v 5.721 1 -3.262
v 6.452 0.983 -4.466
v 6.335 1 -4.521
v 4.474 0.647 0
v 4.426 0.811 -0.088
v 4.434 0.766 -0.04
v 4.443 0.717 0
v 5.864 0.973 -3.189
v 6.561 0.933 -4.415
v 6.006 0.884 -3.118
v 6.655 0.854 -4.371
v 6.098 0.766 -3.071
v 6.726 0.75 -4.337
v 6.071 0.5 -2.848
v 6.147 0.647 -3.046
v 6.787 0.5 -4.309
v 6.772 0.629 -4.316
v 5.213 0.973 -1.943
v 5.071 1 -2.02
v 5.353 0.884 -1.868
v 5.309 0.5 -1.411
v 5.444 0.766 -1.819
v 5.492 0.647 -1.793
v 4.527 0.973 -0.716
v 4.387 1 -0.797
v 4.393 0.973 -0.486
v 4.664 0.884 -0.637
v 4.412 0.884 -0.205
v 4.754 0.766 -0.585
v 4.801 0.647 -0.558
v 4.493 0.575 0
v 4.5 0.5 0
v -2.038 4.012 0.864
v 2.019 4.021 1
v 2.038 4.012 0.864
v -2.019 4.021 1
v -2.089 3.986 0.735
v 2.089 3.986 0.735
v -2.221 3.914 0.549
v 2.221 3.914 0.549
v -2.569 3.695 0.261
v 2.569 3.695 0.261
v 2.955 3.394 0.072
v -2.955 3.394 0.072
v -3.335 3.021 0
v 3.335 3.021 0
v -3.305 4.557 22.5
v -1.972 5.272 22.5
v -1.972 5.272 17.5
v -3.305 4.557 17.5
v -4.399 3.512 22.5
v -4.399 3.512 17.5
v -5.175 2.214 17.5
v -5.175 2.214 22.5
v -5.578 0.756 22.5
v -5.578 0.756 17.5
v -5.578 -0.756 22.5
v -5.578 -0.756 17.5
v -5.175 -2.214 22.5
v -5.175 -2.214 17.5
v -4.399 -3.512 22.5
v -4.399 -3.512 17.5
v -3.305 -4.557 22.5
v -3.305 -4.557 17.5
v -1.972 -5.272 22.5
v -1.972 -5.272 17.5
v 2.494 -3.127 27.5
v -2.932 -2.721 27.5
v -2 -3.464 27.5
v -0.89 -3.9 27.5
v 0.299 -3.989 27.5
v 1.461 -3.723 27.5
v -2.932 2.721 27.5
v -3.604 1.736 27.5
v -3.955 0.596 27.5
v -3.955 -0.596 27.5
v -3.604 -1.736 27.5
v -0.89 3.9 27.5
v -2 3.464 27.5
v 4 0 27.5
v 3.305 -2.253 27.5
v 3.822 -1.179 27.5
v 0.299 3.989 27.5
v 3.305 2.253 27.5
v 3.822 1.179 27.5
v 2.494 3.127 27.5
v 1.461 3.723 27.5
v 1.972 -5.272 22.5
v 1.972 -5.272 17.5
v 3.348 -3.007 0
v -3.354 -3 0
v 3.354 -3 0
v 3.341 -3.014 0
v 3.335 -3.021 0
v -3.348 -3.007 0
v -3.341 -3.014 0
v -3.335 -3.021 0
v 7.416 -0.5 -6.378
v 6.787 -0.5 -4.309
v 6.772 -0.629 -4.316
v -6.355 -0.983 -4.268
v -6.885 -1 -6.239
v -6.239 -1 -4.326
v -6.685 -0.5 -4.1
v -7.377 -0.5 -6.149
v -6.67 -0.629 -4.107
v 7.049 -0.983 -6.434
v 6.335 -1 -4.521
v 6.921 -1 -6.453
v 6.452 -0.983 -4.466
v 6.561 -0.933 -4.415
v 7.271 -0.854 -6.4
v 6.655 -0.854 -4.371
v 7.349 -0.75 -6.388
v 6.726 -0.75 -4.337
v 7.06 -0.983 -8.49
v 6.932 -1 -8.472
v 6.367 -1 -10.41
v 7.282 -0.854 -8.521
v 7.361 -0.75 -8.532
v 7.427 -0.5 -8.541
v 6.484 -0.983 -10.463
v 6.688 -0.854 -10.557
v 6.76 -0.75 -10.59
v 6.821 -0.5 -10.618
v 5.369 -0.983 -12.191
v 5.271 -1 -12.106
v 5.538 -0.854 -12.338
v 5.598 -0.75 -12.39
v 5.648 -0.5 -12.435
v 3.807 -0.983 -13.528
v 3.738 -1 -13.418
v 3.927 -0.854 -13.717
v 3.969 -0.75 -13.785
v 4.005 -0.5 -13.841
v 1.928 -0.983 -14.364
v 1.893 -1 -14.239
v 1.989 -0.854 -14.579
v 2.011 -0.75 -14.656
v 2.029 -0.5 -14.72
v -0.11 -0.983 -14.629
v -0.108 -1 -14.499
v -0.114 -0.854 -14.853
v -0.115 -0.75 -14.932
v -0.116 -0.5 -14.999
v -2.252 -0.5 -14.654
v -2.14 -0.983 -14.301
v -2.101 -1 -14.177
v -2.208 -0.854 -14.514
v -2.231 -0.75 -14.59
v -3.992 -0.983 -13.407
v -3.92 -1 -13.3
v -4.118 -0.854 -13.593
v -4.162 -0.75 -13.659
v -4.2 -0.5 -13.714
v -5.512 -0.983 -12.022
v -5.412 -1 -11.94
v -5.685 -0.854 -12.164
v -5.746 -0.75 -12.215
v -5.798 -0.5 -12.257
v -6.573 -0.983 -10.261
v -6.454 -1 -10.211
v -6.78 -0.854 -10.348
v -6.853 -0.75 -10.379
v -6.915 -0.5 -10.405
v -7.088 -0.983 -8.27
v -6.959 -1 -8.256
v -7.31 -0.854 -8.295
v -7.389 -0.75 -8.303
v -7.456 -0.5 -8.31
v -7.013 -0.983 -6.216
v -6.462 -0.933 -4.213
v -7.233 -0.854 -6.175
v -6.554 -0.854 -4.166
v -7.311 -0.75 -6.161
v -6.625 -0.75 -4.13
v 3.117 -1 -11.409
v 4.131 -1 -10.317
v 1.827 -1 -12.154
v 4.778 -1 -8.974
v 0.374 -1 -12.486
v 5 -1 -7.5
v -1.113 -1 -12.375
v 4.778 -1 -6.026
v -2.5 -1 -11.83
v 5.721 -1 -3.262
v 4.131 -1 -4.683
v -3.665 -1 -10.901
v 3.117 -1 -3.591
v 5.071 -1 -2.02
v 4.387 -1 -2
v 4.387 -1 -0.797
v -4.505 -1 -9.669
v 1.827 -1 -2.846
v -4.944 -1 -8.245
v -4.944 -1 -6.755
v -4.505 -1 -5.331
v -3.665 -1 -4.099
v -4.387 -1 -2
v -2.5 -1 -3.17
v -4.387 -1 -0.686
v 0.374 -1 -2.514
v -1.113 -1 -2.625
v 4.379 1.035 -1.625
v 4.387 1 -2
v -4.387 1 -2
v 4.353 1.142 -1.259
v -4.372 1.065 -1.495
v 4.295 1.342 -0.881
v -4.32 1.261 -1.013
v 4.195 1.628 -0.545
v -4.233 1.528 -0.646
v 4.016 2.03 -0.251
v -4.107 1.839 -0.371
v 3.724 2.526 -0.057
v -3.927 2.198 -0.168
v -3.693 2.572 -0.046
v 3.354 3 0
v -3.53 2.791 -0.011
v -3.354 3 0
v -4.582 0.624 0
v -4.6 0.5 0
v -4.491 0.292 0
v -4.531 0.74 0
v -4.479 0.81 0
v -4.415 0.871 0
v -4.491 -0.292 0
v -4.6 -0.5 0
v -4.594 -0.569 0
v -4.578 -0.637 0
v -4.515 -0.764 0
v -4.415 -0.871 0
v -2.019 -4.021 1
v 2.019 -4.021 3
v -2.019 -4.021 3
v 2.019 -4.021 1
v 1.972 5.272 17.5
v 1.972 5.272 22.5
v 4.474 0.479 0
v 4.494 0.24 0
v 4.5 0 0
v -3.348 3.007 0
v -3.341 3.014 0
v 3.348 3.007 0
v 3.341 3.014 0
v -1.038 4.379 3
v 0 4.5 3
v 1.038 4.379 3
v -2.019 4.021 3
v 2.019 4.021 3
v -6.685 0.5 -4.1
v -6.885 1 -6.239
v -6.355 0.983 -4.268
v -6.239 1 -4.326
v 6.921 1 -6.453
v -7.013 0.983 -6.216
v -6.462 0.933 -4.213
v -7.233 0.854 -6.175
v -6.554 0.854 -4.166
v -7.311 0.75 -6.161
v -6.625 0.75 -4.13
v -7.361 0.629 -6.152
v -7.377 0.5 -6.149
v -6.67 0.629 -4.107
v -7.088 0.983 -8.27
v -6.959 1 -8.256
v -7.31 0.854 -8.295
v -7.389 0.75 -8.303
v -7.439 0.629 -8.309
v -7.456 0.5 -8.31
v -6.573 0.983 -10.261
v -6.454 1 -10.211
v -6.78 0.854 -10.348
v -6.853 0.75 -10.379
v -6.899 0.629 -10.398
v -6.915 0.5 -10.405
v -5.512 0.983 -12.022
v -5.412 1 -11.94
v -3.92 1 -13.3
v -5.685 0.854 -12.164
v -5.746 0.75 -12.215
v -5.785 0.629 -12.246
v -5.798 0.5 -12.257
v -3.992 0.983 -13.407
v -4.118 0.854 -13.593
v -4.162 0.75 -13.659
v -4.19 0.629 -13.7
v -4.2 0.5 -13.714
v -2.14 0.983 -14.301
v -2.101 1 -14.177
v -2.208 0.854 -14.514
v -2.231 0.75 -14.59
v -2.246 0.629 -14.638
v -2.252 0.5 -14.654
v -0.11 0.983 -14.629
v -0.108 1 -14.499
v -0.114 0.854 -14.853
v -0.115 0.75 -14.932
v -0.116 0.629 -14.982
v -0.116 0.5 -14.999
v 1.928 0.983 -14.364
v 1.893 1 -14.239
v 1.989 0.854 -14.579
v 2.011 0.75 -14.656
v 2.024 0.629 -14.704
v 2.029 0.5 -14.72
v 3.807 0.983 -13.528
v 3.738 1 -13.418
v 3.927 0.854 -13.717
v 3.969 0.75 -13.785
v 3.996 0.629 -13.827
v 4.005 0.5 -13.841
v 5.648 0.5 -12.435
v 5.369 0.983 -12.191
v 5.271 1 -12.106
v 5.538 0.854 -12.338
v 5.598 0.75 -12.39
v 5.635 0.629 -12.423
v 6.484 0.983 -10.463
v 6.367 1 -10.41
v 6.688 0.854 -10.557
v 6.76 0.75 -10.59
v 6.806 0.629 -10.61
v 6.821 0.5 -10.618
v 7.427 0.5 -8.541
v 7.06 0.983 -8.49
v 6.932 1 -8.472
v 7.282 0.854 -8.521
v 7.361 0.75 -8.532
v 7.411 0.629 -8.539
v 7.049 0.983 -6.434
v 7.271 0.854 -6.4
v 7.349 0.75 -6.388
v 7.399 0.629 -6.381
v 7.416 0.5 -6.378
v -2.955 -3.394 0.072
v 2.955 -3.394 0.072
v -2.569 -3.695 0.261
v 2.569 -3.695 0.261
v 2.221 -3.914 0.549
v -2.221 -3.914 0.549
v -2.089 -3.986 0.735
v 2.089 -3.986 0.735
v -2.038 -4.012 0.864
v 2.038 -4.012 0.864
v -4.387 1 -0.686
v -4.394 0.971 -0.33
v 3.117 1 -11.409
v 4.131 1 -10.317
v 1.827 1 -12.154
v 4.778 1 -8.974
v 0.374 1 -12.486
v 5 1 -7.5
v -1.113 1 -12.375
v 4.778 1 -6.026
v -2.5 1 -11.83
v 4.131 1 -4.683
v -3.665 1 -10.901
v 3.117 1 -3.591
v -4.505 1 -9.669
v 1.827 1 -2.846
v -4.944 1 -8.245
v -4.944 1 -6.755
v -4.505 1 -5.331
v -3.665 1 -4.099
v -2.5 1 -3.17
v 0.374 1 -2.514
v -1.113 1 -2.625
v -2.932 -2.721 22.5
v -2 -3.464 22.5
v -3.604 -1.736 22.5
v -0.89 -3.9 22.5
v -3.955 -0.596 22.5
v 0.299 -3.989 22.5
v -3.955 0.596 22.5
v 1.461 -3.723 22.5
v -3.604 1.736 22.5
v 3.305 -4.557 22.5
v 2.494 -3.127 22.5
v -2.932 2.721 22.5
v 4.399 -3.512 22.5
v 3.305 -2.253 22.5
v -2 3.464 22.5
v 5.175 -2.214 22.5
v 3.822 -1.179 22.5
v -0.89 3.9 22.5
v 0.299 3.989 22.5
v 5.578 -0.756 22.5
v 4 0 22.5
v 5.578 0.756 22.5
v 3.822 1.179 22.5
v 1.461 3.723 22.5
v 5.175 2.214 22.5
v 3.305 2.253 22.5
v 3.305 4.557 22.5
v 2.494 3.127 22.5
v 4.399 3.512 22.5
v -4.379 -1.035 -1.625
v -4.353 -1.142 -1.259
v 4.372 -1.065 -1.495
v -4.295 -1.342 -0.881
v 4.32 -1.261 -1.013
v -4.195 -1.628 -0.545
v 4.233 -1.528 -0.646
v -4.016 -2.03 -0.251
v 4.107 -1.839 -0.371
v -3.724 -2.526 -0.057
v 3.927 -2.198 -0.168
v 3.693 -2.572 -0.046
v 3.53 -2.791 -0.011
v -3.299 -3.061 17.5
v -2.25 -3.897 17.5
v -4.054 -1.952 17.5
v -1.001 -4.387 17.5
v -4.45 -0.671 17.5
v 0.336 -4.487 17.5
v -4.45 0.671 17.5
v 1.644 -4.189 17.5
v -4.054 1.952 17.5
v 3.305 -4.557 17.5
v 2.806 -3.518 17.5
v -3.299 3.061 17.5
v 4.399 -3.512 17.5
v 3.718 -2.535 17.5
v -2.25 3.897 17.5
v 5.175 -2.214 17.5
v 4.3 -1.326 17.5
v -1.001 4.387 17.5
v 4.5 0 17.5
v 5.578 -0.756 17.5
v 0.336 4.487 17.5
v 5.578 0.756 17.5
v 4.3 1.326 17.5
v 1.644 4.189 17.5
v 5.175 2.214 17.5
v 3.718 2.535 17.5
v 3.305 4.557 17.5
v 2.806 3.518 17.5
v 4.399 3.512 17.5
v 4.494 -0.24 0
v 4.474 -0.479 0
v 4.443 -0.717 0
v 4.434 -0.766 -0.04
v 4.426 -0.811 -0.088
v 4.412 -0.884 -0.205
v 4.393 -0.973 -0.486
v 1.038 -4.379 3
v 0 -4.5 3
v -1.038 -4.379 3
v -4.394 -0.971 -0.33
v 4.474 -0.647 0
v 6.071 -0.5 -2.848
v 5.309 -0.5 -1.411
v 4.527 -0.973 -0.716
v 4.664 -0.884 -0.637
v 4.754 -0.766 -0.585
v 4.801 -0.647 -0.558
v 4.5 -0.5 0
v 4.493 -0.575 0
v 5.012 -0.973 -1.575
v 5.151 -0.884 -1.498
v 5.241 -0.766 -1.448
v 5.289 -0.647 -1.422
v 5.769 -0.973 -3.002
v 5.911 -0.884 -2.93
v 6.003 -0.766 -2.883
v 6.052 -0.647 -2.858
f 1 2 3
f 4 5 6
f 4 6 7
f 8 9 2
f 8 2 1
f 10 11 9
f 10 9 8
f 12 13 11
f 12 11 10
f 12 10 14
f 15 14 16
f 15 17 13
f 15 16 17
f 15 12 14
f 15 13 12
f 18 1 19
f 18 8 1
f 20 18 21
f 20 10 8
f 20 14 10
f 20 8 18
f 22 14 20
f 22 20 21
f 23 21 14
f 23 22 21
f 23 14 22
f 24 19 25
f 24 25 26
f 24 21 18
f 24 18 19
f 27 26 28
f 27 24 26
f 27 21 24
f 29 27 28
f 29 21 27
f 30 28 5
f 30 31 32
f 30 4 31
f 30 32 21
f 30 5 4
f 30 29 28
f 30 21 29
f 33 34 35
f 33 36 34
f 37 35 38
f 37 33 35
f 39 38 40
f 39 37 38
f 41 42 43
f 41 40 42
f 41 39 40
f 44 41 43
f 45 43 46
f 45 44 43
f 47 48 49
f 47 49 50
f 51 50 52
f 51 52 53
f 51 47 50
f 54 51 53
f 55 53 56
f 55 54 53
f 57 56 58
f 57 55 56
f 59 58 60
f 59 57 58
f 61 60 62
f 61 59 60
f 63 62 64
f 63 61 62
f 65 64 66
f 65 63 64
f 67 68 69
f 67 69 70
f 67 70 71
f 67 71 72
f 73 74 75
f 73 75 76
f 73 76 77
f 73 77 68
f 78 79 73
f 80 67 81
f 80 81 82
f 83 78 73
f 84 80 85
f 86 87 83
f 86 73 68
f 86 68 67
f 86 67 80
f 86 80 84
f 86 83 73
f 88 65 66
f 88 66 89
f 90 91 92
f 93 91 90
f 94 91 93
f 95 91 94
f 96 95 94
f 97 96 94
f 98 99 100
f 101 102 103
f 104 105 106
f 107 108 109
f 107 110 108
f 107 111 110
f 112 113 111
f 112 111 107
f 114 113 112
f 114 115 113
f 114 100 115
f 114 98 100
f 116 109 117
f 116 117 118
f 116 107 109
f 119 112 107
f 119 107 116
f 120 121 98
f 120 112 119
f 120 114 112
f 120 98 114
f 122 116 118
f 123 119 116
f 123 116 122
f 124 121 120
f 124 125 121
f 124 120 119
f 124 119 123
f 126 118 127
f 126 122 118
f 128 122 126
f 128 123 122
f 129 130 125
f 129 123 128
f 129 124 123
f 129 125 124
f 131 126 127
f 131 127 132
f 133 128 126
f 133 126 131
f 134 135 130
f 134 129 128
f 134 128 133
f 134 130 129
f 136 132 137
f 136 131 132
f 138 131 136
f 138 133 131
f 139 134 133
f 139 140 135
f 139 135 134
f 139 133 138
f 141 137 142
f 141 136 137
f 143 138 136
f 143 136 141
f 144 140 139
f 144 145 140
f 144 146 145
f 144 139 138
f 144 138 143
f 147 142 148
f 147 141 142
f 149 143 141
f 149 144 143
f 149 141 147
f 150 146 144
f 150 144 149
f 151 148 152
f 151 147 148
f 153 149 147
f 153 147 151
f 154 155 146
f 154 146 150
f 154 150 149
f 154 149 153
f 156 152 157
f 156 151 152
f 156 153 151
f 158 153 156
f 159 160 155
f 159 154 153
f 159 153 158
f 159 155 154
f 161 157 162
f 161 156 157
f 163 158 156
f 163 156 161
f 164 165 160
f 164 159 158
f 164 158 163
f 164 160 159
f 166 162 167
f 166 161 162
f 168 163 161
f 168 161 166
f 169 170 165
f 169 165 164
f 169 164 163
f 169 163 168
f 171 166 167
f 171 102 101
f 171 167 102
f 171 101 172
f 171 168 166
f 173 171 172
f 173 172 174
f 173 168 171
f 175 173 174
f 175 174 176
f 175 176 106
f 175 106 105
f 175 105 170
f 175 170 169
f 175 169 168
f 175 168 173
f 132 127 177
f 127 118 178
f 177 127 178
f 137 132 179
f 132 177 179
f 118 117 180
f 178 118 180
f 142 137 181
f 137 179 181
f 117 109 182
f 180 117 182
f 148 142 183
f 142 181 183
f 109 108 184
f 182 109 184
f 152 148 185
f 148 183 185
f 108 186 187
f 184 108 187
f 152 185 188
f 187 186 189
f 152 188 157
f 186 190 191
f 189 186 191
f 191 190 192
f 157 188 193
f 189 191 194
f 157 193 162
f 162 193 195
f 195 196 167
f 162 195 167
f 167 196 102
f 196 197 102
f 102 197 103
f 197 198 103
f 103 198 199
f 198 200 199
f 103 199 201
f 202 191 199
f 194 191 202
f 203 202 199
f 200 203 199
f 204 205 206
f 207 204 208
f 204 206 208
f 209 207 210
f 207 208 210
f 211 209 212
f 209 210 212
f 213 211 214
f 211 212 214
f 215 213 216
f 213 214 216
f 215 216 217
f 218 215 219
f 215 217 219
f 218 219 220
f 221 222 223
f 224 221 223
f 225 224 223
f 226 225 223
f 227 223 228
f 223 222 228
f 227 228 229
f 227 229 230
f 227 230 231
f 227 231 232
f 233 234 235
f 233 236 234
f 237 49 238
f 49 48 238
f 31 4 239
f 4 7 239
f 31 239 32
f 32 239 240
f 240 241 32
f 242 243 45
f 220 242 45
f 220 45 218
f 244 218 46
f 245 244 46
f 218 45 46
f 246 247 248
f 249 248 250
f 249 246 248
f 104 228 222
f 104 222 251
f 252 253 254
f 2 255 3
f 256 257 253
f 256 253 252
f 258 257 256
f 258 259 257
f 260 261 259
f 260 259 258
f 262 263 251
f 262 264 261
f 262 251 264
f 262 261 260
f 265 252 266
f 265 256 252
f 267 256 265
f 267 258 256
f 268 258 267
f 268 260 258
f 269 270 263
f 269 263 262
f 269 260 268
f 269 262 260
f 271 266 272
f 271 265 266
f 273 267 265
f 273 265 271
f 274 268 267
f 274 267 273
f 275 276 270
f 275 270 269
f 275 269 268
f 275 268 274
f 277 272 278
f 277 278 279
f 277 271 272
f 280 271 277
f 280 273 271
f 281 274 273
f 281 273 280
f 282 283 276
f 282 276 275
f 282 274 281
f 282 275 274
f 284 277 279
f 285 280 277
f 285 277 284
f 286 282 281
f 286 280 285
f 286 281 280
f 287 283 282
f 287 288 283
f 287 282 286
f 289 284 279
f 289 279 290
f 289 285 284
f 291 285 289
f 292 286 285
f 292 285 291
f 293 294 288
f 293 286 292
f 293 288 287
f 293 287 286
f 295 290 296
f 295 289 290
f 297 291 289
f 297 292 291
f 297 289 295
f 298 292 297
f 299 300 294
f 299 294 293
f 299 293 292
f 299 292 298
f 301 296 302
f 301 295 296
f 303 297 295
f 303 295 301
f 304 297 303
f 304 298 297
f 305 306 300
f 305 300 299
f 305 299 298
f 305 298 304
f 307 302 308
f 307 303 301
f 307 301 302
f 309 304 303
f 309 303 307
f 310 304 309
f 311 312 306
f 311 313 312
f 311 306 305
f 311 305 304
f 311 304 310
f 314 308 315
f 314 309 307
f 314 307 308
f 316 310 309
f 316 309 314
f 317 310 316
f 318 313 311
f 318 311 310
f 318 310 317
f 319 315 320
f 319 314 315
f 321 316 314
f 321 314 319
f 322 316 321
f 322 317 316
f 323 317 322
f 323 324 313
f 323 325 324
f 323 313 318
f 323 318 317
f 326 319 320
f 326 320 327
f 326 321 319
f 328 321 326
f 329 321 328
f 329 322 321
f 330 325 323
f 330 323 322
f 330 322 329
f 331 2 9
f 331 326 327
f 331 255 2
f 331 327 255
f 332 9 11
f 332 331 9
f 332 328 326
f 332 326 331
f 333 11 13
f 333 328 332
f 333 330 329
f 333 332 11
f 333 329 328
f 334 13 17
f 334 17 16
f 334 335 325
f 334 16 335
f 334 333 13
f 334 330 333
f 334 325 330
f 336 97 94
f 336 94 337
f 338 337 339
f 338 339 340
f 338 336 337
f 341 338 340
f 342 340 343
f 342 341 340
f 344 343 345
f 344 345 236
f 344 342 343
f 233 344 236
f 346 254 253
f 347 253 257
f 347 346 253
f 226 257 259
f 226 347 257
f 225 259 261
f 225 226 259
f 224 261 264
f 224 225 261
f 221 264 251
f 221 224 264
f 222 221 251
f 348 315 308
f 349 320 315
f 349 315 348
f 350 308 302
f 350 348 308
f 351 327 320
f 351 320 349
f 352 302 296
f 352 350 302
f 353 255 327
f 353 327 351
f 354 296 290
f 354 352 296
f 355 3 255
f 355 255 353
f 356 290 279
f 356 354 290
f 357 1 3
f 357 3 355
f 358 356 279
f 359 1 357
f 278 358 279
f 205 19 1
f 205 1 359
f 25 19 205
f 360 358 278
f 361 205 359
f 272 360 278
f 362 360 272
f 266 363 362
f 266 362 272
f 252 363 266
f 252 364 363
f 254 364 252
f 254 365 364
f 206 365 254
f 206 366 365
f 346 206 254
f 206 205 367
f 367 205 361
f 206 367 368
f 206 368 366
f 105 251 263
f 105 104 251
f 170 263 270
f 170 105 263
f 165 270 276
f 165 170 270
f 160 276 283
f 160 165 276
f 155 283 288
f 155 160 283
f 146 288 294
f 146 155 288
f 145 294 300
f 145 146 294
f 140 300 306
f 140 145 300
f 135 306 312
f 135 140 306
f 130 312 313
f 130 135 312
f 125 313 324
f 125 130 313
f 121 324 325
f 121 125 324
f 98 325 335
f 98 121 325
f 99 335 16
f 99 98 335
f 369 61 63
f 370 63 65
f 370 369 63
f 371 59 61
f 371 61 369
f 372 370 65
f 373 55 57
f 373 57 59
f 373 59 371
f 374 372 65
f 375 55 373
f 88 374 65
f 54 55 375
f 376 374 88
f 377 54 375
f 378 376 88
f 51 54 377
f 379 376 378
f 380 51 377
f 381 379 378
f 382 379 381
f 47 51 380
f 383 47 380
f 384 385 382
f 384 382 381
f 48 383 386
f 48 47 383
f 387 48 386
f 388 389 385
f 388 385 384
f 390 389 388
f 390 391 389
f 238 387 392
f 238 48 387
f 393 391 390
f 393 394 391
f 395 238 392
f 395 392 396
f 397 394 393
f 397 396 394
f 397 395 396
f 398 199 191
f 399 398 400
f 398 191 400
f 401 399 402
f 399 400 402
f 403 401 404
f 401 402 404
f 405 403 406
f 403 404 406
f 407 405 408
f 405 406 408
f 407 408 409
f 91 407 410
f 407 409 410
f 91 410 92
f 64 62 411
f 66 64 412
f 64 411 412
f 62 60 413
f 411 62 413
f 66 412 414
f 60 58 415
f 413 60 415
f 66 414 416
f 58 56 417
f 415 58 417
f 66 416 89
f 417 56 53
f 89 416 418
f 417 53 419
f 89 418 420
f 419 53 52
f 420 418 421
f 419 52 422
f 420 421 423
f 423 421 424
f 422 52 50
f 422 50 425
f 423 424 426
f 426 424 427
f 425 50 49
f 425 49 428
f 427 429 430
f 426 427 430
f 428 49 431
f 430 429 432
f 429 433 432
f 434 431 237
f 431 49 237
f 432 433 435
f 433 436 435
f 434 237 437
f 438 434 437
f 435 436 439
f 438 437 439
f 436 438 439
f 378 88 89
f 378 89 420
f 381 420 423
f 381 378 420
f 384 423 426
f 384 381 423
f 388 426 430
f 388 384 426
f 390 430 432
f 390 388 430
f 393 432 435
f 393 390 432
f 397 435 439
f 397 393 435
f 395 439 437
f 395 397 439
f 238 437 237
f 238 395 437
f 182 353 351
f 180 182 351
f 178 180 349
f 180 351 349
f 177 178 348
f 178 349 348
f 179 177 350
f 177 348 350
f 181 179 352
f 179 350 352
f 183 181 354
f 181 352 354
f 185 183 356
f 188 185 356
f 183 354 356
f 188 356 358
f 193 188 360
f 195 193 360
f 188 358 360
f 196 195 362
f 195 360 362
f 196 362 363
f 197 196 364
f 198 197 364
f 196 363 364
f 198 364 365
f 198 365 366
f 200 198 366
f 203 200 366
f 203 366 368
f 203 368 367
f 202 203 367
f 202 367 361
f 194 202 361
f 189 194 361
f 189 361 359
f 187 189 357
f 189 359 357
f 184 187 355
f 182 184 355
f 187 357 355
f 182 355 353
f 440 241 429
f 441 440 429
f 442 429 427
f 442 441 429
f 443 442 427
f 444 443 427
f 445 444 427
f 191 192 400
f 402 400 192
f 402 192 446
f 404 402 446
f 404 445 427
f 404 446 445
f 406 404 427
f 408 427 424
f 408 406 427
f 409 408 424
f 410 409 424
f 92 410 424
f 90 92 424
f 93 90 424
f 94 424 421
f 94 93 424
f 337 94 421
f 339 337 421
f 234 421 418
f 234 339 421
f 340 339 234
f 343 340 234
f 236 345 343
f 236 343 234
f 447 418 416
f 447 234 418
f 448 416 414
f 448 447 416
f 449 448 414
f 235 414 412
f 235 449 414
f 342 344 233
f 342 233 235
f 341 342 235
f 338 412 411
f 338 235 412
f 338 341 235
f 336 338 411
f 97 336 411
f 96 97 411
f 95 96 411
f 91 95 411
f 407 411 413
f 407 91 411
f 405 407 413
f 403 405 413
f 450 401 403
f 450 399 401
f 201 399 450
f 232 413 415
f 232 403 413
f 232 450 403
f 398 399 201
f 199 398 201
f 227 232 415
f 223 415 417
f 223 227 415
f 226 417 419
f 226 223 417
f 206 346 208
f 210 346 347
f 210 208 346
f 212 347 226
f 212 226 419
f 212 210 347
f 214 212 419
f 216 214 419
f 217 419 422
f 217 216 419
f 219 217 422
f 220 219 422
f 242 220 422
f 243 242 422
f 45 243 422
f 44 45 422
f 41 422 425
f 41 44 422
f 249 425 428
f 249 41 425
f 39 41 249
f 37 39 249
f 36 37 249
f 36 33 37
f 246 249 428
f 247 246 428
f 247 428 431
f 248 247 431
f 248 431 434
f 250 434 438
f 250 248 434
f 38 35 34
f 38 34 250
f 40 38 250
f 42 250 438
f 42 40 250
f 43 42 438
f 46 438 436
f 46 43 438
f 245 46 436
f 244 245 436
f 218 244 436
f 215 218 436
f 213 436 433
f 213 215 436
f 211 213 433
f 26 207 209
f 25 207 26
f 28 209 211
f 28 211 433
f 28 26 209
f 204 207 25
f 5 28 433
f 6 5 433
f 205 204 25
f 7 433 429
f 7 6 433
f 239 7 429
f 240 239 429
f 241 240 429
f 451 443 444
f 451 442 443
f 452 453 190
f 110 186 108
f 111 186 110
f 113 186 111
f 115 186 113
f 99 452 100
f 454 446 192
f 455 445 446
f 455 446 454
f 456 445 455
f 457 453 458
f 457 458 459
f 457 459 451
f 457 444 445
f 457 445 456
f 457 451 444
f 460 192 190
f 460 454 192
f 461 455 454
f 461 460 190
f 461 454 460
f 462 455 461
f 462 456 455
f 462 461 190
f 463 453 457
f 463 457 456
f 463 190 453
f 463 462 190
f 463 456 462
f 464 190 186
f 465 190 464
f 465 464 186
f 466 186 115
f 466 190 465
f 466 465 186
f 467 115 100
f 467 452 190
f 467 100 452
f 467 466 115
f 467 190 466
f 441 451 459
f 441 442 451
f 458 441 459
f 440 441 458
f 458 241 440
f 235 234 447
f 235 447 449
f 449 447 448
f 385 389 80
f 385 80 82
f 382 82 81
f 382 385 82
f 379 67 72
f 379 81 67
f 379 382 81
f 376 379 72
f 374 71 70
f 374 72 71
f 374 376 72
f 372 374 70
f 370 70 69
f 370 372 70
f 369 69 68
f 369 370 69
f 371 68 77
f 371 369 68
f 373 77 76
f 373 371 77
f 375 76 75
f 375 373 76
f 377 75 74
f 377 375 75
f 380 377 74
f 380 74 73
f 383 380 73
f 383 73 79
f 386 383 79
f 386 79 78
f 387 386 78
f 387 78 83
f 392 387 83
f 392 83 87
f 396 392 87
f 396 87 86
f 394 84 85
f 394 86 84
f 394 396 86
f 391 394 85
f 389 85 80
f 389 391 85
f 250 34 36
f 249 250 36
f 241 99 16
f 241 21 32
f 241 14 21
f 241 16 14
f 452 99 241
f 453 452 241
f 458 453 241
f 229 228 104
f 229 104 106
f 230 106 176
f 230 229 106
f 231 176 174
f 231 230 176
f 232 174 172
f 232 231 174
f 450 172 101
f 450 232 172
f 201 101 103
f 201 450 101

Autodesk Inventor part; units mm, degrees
ref_plane "YZ Plane" through (0, 0, 0) normal (1, 0, 0) x (0, 1, 0)
ref_plane "XZ Plane" through (0, 0, 0) normal (0, 1, 0) x (-1, 0, 0)
ref_plane "XY Plane" through (0, 0, 0) normal (0, 0, 1) x (1, 0, 0)
sketch "Sketch1" plane through (0, 0, 0) normal (0, 0, 1) x (1, 0, 0)
  circle A0 centre (0, 0) radius 4
  line L0 (-1.555751, 4.751804) -> (1.555751, 4.751804)
  line L1 (0, 0) -> (1.555751, 0)
  line L2 (-1.555751, -4.751804) -> (1.555751, -4.751804)
  arc A1 (-1.555751, 4.751804) -> (-1.555751, -4.751804) centre (0, 0) ccw
  arc A2 (1.555751, -4.751804) -> (1.555751, 4.751804) centre (0, 0) ccw
  circle A3 centre (0, 0) radius 4.5
  dimension "d0" = 8
  dimension "d2" = 9
extrude "Extrusion1" add sketch "Sketch1" along normal blind 27.5 contours A0
extrude "Extrusion2" add sketch "Sketch1" along normal blind 22.5 contours A3
sketch "Sketch2" plane through (0, 0, 22.5) normal (0, 0, 1) x (1, 0, 0)
  circle A0 centre (0, 0) radius 5.629087
  line L0 (0, 0) -> (1.158118, 0)
  line L1 (-1.971905, 5.2724) -> (1.971905, 5.2724)
  line L2 (-1.971905, -5.2724) -> (1.971905, -5.2724)
extrude "Extrusion3" add sketch "Sketch2" against normal blind 5 contours A0 L2 L1
sketch "Sketch3" plane through (0, 0, 0) normal (0, 0, -1) x (-1, 0, 0)
  circle A0 centre (0, 0) radius 4.5
  line L0 (-2.019433, 4.021429) -> (2.019433, 4.021429)
  line L1 (0, 0) -> (1.467716, 0)
  line L2 (-2.019433, -4.021429) -> (2.019433, -4.021429)
  arc A1 (2.019433, 4.021429) -> (-2.019433, 4.021429) centre (0, 0) ccw
  arc A2 (-2.019433, -4.021429) -> (2.019433, -4.021429) centre (0, 0) ccw
extrude "Extrusion4" cut sketch "Sketch3" against normal blind 3 contours L0 A0 | A0 L2
sketch "Sketch4" plane through (0, 0, 0) normal (0, 1, 0) x (-1, 0, 0)
  circle A0 centre (0, -7.5) radius 7.5
  line L0 (2.019433, 0) -> (-2.019433, 0)
  line L1 (-2.019433, 0) -> (-4.5, 0)
  line L2 (-4.5, 0) -> (4.599623, 0)
  arc A1 (-4.5, 0) -> (-6.78711, -4.308583) centre (38.772452, -25.731481) ccw
  line L3 (4.599623, 0) -> (6.684935, -4.099757)
  line L4 (-4.5, 0) -> (4.599623, 0)
  point P0 (0, 0)
  point P1 (0, 0)
  dimension "d11" = 15
  dimension "d12" = 7.5
extrude "Extrusion5" add sketch "Sketch4" against normal blind 1
extrude "Extrusion6" add sketch "Sketch4" along normal blind 1
sketch "Sketch6" plane through (0, 1, 0) normal (0, 1, 0) x (1, 0, 0)
  arc A0 (6.78711, 4.308583) -> (-6.684935, 4.099757) centre (0, 7.5) ccw
  circle A1 centre (0, 7.5) radius 5
  point P0 (0, 0)
  dimension "d17" = 10
extrude "Extrusion7" cut sketch "Sketch6" against normal blind 2
fillet "Fillet1" radius 2 2 edges at (0, 1, 0) (0, -1, 0)
fillet "Fillet2" radius 1 2 edges at (0, -4.0214, 0) (0, 4.0214, 0)
fillet "Fillet3" radius 0.5 6 edges at (-5.6423, 1, -2.0499) (5.6958, 1, -2.1266) (-0.1162, 1, -14.9991) (5.6958, -1, -2.1266) (-5.6423, -1, -2.0499) (-0.1162, -1, -14.9991)
equation "\"BendRadius\" = Thickness"
equation "\"BendReliefWidth\" = Thickness"
equation "\"BendReliefDepth\" = 0.5 * Thickness"
equation "\"CornerReliefSize\" = 4 * Thickness"
equation "\"MinimumRemnant\" = 2 * Thickness"
equation "\"TransitionRadius\" = BendRadius"
equation "\"JacobiRadiusSize\" = BendRadius"
equation "\"GapSize\" = Thickness"
equation "\"Thickness\" = 0.5"
properties part number "vòng bi_dài 35mm"
